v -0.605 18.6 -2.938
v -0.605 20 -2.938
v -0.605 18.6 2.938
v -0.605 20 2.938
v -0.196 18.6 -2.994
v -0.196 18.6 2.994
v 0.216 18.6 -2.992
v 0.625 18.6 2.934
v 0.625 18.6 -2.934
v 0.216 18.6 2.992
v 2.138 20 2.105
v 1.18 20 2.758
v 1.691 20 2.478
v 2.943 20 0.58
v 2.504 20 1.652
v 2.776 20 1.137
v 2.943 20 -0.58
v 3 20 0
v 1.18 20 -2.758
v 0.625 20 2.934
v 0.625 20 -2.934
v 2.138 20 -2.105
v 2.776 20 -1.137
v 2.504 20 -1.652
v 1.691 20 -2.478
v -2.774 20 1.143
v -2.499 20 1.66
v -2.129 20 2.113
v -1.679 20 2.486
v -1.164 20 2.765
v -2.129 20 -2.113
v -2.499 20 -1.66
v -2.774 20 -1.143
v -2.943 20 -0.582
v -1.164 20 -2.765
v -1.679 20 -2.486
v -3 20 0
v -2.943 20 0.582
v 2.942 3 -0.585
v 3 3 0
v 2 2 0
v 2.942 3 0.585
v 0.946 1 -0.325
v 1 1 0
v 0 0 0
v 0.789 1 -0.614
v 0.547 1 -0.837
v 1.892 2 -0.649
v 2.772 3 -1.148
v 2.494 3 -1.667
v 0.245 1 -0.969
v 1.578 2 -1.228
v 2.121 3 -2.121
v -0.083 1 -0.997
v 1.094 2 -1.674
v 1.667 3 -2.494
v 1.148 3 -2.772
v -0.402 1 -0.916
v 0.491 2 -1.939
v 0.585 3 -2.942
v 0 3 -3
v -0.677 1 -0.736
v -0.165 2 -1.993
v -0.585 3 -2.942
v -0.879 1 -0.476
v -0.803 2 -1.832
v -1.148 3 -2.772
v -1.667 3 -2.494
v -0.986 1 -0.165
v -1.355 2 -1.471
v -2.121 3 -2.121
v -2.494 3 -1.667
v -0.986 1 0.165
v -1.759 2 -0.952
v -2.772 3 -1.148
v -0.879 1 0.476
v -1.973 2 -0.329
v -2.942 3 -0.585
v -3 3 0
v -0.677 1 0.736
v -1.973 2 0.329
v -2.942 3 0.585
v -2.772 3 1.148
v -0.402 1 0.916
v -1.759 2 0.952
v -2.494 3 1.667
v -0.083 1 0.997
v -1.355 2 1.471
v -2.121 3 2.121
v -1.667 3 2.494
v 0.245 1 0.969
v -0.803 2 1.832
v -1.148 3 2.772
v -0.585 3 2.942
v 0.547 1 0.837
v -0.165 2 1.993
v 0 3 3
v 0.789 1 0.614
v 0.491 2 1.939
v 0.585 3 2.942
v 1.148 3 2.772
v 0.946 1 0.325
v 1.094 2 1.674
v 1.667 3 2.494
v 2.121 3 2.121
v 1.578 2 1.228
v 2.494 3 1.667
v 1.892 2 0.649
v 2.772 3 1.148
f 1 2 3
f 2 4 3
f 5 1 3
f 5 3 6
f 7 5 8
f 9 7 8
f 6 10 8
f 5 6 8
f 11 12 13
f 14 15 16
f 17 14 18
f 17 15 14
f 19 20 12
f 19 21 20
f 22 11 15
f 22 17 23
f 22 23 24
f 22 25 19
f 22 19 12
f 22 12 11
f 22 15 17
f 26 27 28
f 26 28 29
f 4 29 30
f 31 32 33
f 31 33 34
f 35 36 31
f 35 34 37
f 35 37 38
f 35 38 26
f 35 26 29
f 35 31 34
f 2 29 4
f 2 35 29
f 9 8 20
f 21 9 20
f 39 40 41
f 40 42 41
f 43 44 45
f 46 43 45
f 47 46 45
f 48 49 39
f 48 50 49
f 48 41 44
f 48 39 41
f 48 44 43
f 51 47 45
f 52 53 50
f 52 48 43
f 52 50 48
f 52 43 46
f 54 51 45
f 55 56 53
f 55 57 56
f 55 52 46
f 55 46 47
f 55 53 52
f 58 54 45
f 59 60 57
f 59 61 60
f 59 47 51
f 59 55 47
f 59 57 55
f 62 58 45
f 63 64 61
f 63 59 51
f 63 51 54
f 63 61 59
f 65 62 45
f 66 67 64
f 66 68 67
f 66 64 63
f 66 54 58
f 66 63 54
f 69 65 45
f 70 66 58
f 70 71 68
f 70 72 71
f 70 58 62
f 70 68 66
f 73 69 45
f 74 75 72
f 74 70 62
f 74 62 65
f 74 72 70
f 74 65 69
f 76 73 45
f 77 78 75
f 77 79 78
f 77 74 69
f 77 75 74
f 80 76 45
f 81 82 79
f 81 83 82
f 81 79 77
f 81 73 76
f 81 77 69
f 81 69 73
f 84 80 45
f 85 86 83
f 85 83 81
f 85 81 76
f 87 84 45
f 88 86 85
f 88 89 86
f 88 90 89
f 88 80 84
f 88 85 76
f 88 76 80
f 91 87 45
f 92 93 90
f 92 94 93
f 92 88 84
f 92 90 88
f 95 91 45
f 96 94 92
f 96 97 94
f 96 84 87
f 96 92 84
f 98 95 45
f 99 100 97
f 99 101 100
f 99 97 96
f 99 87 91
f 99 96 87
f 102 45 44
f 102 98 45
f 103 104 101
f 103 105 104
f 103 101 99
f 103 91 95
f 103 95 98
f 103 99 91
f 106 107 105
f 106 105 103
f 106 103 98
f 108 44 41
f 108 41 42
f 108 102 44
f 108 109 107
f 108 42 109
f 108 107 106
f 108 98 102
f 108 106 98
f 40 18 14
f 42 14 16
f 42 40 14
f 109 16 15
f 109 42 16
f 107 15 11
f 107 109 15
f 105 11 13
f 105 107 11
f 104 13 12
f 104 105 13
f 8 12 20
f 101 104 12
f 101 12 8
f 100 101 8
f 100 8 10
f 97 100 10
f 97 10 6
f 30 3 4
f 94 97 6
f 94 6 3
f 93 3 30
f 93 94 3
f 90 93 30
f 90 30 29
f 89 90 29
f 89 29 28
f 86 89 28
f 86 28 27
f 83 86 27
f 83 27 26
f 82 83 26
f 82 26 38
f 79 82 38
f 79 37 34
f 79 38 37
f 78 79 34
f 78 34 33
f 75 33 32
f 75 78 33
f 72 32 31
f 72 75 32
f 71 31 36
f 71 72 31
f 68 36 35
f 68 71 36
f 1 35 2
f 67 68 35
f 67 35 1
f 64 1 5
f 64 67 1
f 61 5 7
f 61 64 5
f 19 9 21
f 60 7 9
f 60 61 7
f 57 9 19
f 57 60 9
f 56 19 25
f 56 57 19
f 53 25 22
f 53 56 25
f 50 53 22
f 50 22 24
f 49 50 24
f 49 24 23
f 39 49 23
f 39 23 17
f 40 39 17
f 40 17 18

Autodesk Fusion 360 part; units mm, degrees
sketch "Sketch1" plane through (0, 0, 0) normal (0, 1, 0) x (1, 0, 0)
  circle A0 centre (0, 0) radius 3
  dimension "d1" = 6
extrude "Extrude1" add sketch "Sketch1" along normal blind 20
chamfer "Chamfer1" distance 3 angle 45 1 edges at (-2.797, 0, 1.0848)
ref_plane "WorkPlane1" through (0, 0, 3) normal (0, 0, 1) x (1, 0, 0)
sketch "Sketch2" plane through (0, 0, 3) normal (0, 0, 1) x (1, 0, 0)
  line L0 (3, 20) -> (-3, 20)
  line L1 (0, 20) -> (0, 18.6)
  line L2 (0, 18.6) -> (0.625, 18.6)
  line L3 (0.625, 18.6) -> (0.625, 20)
  line L4 (0.625, 20) -> (-0.605, 20)
  line L5 (-0.605, 20) -> (-0.605, 18.6)
  line L6 (-0.605, 18.6) -> (0.625, 18.6)
  dimension "d6" = 1.4
  dimension "d7" = 0.625
  dimension "d8" = 1.23
  dimension "d9" = 1.4
extrude "Extrude2" cut sketch "Sketch2" against normal blind 7
